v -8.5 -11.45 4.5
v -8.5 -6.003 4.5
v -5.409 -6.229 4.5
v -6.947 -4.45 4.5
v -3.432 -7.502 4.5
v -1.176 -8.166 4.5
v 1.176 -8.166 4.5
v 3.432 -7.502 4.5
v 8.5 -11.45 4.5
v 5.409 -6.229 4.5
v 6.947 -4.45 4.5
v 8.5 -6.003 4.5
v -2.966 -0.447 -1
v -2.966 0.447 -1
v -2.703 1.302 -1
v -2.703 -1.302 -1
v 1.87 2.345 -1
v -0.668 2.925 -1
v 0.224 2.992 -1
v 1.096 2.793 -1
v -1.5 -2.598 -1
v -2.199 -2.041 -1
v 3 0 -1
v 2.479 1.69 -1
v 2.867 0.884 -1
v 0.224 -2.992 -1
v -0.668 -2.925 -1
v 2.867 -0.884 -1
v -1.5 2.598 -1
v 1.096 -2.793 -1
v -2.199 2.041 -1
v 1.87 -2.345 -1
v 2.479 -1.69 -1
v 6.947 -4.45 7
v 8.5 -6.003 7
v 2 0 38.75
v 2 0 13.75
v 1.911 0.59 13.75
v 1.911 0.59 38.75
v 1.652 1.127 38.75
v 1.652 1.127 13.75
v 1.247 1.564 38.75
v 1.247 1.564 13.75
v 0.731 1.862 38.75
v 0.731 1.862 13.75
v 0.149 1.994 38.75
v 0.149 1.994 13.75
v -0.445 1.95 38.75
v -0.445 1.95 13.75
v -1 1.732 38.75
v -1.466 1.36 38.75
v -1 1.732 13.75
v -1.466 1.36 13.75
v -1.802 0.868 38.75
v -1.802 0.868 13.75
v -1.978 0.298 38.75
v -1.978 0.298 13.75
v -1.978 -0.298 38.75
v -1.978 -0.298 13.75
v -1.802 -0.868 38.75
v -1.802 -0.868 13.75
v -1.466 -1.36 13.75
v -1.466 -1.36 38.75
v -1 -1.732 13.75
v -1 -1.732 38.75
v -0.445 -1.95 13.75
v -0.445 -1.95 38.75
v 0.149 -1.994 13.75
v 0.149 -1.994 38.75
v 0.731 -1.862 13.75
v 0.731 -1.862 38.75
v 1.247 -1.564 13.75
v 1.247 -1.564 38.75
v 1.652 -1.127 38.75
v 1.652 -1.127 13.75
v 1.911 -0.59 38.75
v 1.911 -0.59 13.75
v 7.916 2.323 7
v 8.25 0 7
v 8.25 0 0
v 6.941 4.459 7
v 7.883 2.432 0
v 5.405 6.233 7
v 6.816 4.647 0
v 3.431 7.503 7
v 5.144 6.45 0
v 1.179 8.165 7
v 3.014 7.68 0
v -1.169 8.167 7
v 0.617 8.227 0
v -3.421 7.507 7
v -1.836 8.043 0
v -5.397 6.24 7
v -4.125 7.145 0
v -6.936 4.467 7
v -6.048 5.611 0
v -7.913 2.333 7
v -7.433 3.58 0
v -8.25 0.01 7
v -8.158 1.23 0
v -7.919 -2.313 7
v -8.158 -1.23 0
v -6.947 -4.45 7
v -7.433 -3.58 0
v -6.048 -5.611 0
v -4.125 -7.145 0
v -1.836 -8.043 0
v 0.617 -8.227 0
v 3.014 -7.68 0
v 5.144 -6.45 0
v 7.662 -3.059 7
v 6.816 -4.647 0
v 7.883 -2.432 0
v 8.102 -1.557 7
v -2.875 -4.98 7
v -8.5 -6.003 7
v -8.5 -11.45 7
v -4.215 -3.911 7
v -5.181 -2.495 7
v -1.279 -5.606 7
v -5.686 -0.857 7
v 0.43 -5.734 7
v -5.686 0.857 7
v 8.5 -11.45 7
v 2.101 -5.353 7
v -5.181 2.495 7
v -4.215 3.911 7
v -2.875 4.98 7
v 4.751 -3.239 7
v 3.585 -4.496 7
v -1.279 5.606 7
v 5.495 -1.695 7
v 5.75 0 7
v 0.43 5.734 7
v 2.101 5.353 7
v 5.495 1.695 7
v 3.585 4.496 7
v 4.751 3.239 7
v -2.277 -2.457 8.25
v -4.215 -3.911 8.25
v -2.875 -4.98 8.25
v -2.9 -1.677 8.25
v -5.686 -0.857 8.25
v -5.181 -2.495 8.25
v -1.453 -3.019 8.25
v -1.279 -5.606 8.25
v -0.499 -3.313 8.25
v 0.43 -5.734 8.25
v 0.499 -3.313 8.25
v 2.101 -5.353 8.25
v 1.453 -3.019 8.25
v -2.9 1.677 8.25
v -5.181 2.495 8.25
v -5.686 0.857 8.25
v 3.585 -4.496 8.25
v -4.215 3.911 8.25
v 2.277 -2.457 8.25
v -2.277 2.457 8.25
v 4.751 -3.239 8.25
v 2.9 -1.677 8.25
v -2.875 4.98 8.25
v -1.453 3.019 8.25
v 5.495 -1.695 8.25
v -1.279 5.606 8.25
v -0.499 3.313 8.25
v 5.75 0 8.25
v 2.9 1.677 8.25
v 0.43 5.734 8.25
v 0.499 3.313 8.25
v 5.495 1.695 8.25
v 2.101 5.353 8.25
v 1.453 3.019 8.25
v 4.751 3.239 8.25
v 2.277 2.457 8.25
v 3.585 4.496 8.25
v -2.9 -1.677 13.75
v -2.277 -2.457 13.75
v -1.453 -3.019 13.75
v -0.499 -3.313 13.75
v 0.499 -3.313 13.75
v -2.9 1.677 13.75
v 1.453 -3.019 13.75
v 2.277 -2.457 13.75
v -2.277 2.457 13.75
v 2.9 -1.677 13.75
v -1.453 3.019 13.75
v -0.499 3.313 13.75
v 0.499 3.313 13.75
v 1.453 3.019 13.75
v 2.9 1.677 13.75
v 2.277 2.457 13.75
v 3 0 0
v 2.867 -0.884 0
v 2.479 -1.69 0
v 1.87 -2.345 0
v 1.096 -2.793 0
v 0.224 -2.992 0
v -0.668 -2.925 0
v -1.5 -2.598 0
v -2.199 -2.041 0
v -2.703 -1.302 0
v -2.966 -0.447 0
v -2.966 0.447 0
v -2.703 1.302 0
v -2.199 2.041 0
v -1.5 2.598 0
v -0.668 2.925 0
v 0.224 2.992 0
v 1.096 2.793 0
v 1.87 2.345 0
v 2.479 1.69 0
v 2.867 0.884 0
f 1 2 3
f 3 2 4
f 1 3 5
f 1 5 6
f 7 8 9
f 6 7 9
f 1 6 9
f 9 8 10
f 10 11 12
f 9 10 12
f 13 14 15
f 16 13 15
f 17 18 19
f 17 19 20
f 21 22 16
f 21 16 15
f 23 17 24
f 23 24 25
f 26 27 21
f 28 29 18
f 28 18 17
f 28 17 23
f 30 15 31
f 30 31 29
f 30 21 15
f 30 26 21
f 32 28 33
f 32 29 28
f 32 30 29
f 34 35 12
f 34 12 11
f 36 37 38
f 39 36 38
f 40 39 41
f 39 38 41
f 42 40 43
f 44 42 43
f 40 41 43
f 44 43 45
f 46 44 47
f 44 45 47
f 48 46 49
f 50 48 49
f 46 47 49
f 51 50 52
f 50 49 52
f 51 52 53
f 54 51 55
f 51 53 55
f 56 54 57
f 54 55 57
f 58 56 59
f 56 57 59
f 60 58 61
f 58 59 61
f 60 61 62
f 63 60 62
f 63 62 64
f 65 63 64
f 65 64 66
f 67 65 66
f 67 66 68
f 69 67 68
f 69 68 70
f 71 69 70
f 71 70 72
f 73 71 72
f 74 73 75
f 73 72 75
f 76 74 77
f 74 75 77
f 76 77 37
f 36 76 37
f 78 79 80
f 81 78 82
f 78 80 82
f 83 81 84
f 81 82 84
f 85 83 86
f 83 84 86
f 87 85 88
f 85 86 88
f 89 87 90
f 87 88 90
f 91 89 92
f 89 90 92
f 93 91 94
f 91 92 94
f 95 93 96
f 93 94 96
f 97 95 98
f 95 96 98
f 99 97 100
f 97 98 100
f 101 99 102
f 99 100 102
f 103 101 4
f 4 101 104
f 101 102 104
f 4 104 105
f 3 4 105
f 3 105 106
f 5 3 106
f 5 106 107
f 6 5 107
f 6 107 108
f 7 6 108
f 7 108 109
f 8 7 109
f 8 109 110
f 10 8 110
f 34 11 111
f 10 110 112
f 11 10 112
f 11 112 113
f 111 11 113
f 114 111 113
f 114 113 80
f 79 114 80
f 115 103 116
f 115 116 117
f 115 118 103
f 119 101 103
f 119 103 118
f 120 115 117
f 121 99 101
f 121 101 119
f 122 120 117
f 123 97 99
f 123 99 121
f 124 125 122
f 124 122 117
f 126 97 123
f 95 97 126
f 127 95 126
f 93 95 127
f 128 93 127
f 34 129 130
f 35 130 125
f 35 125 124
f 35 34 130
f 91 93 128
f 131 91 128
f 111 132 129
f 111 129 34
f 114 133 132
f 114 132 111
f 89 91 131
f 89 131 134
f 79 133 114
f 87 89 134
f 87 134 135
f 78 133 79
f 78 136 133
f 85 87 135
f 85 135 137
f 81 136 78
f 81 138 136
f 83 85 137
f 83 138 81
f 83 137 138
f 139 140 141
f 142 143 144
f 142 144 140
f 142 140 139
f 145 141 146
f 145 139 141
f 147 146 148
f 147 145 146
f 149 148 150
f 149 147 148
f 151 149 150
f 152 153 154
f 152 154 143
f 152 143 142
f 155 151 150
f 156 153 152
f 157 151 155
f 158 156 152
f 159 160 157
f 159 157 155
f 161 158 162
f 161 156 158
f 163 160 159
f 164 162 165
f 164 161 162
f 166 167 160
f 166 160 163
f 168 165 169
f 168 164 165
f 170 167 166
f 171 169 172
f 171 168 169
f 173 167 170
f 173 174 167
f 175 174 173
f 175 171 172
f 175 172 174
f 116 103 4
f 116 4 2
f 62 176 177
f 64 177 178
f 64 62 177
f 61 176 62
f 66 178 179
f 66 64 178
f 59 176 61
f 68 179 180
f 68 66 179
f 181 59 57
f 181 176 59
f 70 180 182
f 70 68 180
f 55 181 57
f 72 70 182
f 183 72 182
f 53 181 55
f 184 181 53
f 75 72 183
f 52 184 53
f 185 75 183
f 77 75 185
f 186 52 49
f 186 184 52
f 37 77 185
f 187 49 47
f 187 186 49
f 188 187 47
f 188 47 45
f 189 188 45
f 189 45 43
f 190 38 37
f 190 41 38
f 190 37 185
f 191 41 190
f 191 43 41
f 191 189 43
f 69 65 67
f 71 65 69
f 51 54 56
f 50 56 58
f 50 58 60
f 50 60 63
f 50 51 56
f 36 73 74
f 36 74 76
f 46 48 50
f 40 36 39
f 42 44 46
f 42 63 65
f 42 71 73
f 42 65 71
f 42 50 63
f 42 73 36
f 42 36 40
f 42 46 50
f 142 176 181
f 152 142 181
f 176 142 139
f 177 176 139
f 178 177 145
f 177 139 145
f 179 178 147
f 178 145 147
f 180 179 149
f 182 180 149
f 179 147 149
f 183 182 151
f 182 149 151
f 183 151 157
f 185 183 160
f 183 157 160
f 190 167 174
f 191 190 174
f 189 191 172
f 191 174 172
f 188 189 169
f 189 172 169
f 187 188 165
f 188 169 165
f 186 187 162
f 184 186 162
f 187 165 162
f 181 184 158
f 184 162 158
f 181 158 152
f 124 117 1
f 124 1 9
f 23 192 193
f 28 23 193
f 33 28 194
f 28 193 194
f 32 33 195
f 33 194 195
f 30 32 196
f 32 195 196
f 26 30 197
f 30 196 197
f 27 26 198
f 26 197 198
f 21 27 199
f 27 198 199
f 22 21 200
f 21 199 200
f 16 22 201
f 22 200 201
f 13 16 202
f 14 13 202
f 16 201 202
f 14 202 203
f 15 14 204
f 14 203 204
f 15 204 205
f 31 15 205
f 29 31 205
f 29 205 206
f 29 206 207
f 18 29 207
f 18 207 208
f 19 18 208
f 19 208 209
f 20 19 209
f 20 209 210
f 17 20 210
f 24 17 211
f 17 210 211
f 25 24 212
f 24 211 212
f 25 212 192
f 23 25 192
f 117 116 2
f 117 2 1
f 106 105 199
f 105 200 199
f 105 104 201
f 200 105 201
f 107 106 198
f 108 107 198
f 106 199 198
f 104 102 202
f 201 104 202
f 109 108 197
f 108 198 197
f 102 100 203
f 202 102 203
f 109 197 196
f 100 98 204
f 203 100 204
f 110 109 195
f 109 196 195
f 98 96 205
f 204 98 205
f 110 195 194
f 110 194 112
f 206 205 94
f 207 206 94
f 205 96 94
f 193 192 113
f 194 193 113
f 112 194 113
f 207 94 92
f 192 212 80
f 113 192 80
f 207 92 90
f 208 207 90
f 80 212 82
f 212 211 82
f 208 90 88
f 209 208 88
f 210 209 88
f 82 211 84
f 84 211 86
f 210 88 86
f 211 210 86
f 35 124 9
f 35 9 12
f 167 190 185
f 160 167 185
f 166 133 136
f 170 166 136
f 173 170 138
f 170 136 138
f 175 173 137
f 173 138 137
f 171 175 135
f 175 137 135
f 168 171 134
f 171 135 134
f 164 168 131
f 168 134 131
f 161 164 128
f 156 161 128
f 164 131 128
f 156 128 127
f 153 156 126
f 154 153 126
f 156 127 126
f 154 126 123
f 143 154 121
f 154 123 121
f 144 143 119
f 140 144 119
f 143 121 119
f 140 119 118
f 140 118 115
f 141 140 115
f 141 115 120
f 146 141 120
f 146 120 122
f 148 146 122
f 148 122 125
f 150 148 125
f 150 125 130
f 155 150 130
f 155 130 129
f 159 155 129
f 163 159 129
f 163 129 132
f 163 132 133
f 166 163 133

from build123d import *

# Parameters (mm, degrees)
F0_R      = 8.25
F1_DEPTH  = 7
F2_R      = 3
F3_DEPTH  = 1
F4_R      = 5.75
F5_DEPTH  = 1.25
F6_R      = 3.35
F7_DEPTH  = 5.5
F9_DEPTH  = 5.5
F10_R     = 2
F11_DEPTH = 25
F13_DEPTH = 2.5


with BuildPart() as f1:
    # F0 (on Top) → F1 (new body)
    with BuildSketch(Plane.XY):
        Circle(F0_R)
    extrude(amount=F1_DEPTH)

    # F2 (on face) → F3 (join)
    with BuildSketch(Plane(origin=(0, 0, 0), x_dir=(1, 0, 0), z_dir=(0, 0, -1))):
        Circle(F2_R)
    extrude(amount=F3_DEPTH)

    # F4 (on face) → F5 (join)
    with BuildSketch(Plane.XY.offset(7)):
        Circle(F4_R)
    extrude(amount=F5_DEPTH)

    # F6 (on face) → F7 (join)
    with BuildSketch(Plane.XY.offset(8.25)):
        Circle(F6_R)
    extrude(amount=F7_DEPTH)

    # F8 (on face) → F9 (cut, through all)
    with BuildSketch(Plane.XY.offset(13.75)):
        with BuildLine():
            ThreePointArc((-2.9, 1.677051), (-3.35, 0), (-2.9, -1.677051))
            Line((-2.9, -1.677051), (-2.9, 1.677051))
        make_face()
        with BuildLine():
            Line((2.9, 1.677051), (2.9, -1.677051))
            ThreePointArc((2.9, -1.677051), (3.235545, -0.868188), (3.35, 0))
            ThreePointArc((3.35, 0), (3.235545, 0.868188), (2.9, 1.677051))
        make_face()
    extrude(amount=-F9_DEPTH, mode=Mode.SUBTRACT)

    # F10 (on face) → F11 (join)
    with BuildSketch(Plane.XY.offset(13.75)):
        Circle(F10_R)
    extrude(amount=F11_DEPTH)

    # F12 (on face) → F13 (join)
    with BuildSketch(Plane.XY.offset(7)):
        Polygon((-8.5, -11.45), (8.5, -11.45), (8.5, -6.003058), (6.946942, -4.45), (-6.946942, -4.45), (-8.5, -6.003058), align=None)
    extrude(amount=-F13_DEPTH)


solid = f1.part
